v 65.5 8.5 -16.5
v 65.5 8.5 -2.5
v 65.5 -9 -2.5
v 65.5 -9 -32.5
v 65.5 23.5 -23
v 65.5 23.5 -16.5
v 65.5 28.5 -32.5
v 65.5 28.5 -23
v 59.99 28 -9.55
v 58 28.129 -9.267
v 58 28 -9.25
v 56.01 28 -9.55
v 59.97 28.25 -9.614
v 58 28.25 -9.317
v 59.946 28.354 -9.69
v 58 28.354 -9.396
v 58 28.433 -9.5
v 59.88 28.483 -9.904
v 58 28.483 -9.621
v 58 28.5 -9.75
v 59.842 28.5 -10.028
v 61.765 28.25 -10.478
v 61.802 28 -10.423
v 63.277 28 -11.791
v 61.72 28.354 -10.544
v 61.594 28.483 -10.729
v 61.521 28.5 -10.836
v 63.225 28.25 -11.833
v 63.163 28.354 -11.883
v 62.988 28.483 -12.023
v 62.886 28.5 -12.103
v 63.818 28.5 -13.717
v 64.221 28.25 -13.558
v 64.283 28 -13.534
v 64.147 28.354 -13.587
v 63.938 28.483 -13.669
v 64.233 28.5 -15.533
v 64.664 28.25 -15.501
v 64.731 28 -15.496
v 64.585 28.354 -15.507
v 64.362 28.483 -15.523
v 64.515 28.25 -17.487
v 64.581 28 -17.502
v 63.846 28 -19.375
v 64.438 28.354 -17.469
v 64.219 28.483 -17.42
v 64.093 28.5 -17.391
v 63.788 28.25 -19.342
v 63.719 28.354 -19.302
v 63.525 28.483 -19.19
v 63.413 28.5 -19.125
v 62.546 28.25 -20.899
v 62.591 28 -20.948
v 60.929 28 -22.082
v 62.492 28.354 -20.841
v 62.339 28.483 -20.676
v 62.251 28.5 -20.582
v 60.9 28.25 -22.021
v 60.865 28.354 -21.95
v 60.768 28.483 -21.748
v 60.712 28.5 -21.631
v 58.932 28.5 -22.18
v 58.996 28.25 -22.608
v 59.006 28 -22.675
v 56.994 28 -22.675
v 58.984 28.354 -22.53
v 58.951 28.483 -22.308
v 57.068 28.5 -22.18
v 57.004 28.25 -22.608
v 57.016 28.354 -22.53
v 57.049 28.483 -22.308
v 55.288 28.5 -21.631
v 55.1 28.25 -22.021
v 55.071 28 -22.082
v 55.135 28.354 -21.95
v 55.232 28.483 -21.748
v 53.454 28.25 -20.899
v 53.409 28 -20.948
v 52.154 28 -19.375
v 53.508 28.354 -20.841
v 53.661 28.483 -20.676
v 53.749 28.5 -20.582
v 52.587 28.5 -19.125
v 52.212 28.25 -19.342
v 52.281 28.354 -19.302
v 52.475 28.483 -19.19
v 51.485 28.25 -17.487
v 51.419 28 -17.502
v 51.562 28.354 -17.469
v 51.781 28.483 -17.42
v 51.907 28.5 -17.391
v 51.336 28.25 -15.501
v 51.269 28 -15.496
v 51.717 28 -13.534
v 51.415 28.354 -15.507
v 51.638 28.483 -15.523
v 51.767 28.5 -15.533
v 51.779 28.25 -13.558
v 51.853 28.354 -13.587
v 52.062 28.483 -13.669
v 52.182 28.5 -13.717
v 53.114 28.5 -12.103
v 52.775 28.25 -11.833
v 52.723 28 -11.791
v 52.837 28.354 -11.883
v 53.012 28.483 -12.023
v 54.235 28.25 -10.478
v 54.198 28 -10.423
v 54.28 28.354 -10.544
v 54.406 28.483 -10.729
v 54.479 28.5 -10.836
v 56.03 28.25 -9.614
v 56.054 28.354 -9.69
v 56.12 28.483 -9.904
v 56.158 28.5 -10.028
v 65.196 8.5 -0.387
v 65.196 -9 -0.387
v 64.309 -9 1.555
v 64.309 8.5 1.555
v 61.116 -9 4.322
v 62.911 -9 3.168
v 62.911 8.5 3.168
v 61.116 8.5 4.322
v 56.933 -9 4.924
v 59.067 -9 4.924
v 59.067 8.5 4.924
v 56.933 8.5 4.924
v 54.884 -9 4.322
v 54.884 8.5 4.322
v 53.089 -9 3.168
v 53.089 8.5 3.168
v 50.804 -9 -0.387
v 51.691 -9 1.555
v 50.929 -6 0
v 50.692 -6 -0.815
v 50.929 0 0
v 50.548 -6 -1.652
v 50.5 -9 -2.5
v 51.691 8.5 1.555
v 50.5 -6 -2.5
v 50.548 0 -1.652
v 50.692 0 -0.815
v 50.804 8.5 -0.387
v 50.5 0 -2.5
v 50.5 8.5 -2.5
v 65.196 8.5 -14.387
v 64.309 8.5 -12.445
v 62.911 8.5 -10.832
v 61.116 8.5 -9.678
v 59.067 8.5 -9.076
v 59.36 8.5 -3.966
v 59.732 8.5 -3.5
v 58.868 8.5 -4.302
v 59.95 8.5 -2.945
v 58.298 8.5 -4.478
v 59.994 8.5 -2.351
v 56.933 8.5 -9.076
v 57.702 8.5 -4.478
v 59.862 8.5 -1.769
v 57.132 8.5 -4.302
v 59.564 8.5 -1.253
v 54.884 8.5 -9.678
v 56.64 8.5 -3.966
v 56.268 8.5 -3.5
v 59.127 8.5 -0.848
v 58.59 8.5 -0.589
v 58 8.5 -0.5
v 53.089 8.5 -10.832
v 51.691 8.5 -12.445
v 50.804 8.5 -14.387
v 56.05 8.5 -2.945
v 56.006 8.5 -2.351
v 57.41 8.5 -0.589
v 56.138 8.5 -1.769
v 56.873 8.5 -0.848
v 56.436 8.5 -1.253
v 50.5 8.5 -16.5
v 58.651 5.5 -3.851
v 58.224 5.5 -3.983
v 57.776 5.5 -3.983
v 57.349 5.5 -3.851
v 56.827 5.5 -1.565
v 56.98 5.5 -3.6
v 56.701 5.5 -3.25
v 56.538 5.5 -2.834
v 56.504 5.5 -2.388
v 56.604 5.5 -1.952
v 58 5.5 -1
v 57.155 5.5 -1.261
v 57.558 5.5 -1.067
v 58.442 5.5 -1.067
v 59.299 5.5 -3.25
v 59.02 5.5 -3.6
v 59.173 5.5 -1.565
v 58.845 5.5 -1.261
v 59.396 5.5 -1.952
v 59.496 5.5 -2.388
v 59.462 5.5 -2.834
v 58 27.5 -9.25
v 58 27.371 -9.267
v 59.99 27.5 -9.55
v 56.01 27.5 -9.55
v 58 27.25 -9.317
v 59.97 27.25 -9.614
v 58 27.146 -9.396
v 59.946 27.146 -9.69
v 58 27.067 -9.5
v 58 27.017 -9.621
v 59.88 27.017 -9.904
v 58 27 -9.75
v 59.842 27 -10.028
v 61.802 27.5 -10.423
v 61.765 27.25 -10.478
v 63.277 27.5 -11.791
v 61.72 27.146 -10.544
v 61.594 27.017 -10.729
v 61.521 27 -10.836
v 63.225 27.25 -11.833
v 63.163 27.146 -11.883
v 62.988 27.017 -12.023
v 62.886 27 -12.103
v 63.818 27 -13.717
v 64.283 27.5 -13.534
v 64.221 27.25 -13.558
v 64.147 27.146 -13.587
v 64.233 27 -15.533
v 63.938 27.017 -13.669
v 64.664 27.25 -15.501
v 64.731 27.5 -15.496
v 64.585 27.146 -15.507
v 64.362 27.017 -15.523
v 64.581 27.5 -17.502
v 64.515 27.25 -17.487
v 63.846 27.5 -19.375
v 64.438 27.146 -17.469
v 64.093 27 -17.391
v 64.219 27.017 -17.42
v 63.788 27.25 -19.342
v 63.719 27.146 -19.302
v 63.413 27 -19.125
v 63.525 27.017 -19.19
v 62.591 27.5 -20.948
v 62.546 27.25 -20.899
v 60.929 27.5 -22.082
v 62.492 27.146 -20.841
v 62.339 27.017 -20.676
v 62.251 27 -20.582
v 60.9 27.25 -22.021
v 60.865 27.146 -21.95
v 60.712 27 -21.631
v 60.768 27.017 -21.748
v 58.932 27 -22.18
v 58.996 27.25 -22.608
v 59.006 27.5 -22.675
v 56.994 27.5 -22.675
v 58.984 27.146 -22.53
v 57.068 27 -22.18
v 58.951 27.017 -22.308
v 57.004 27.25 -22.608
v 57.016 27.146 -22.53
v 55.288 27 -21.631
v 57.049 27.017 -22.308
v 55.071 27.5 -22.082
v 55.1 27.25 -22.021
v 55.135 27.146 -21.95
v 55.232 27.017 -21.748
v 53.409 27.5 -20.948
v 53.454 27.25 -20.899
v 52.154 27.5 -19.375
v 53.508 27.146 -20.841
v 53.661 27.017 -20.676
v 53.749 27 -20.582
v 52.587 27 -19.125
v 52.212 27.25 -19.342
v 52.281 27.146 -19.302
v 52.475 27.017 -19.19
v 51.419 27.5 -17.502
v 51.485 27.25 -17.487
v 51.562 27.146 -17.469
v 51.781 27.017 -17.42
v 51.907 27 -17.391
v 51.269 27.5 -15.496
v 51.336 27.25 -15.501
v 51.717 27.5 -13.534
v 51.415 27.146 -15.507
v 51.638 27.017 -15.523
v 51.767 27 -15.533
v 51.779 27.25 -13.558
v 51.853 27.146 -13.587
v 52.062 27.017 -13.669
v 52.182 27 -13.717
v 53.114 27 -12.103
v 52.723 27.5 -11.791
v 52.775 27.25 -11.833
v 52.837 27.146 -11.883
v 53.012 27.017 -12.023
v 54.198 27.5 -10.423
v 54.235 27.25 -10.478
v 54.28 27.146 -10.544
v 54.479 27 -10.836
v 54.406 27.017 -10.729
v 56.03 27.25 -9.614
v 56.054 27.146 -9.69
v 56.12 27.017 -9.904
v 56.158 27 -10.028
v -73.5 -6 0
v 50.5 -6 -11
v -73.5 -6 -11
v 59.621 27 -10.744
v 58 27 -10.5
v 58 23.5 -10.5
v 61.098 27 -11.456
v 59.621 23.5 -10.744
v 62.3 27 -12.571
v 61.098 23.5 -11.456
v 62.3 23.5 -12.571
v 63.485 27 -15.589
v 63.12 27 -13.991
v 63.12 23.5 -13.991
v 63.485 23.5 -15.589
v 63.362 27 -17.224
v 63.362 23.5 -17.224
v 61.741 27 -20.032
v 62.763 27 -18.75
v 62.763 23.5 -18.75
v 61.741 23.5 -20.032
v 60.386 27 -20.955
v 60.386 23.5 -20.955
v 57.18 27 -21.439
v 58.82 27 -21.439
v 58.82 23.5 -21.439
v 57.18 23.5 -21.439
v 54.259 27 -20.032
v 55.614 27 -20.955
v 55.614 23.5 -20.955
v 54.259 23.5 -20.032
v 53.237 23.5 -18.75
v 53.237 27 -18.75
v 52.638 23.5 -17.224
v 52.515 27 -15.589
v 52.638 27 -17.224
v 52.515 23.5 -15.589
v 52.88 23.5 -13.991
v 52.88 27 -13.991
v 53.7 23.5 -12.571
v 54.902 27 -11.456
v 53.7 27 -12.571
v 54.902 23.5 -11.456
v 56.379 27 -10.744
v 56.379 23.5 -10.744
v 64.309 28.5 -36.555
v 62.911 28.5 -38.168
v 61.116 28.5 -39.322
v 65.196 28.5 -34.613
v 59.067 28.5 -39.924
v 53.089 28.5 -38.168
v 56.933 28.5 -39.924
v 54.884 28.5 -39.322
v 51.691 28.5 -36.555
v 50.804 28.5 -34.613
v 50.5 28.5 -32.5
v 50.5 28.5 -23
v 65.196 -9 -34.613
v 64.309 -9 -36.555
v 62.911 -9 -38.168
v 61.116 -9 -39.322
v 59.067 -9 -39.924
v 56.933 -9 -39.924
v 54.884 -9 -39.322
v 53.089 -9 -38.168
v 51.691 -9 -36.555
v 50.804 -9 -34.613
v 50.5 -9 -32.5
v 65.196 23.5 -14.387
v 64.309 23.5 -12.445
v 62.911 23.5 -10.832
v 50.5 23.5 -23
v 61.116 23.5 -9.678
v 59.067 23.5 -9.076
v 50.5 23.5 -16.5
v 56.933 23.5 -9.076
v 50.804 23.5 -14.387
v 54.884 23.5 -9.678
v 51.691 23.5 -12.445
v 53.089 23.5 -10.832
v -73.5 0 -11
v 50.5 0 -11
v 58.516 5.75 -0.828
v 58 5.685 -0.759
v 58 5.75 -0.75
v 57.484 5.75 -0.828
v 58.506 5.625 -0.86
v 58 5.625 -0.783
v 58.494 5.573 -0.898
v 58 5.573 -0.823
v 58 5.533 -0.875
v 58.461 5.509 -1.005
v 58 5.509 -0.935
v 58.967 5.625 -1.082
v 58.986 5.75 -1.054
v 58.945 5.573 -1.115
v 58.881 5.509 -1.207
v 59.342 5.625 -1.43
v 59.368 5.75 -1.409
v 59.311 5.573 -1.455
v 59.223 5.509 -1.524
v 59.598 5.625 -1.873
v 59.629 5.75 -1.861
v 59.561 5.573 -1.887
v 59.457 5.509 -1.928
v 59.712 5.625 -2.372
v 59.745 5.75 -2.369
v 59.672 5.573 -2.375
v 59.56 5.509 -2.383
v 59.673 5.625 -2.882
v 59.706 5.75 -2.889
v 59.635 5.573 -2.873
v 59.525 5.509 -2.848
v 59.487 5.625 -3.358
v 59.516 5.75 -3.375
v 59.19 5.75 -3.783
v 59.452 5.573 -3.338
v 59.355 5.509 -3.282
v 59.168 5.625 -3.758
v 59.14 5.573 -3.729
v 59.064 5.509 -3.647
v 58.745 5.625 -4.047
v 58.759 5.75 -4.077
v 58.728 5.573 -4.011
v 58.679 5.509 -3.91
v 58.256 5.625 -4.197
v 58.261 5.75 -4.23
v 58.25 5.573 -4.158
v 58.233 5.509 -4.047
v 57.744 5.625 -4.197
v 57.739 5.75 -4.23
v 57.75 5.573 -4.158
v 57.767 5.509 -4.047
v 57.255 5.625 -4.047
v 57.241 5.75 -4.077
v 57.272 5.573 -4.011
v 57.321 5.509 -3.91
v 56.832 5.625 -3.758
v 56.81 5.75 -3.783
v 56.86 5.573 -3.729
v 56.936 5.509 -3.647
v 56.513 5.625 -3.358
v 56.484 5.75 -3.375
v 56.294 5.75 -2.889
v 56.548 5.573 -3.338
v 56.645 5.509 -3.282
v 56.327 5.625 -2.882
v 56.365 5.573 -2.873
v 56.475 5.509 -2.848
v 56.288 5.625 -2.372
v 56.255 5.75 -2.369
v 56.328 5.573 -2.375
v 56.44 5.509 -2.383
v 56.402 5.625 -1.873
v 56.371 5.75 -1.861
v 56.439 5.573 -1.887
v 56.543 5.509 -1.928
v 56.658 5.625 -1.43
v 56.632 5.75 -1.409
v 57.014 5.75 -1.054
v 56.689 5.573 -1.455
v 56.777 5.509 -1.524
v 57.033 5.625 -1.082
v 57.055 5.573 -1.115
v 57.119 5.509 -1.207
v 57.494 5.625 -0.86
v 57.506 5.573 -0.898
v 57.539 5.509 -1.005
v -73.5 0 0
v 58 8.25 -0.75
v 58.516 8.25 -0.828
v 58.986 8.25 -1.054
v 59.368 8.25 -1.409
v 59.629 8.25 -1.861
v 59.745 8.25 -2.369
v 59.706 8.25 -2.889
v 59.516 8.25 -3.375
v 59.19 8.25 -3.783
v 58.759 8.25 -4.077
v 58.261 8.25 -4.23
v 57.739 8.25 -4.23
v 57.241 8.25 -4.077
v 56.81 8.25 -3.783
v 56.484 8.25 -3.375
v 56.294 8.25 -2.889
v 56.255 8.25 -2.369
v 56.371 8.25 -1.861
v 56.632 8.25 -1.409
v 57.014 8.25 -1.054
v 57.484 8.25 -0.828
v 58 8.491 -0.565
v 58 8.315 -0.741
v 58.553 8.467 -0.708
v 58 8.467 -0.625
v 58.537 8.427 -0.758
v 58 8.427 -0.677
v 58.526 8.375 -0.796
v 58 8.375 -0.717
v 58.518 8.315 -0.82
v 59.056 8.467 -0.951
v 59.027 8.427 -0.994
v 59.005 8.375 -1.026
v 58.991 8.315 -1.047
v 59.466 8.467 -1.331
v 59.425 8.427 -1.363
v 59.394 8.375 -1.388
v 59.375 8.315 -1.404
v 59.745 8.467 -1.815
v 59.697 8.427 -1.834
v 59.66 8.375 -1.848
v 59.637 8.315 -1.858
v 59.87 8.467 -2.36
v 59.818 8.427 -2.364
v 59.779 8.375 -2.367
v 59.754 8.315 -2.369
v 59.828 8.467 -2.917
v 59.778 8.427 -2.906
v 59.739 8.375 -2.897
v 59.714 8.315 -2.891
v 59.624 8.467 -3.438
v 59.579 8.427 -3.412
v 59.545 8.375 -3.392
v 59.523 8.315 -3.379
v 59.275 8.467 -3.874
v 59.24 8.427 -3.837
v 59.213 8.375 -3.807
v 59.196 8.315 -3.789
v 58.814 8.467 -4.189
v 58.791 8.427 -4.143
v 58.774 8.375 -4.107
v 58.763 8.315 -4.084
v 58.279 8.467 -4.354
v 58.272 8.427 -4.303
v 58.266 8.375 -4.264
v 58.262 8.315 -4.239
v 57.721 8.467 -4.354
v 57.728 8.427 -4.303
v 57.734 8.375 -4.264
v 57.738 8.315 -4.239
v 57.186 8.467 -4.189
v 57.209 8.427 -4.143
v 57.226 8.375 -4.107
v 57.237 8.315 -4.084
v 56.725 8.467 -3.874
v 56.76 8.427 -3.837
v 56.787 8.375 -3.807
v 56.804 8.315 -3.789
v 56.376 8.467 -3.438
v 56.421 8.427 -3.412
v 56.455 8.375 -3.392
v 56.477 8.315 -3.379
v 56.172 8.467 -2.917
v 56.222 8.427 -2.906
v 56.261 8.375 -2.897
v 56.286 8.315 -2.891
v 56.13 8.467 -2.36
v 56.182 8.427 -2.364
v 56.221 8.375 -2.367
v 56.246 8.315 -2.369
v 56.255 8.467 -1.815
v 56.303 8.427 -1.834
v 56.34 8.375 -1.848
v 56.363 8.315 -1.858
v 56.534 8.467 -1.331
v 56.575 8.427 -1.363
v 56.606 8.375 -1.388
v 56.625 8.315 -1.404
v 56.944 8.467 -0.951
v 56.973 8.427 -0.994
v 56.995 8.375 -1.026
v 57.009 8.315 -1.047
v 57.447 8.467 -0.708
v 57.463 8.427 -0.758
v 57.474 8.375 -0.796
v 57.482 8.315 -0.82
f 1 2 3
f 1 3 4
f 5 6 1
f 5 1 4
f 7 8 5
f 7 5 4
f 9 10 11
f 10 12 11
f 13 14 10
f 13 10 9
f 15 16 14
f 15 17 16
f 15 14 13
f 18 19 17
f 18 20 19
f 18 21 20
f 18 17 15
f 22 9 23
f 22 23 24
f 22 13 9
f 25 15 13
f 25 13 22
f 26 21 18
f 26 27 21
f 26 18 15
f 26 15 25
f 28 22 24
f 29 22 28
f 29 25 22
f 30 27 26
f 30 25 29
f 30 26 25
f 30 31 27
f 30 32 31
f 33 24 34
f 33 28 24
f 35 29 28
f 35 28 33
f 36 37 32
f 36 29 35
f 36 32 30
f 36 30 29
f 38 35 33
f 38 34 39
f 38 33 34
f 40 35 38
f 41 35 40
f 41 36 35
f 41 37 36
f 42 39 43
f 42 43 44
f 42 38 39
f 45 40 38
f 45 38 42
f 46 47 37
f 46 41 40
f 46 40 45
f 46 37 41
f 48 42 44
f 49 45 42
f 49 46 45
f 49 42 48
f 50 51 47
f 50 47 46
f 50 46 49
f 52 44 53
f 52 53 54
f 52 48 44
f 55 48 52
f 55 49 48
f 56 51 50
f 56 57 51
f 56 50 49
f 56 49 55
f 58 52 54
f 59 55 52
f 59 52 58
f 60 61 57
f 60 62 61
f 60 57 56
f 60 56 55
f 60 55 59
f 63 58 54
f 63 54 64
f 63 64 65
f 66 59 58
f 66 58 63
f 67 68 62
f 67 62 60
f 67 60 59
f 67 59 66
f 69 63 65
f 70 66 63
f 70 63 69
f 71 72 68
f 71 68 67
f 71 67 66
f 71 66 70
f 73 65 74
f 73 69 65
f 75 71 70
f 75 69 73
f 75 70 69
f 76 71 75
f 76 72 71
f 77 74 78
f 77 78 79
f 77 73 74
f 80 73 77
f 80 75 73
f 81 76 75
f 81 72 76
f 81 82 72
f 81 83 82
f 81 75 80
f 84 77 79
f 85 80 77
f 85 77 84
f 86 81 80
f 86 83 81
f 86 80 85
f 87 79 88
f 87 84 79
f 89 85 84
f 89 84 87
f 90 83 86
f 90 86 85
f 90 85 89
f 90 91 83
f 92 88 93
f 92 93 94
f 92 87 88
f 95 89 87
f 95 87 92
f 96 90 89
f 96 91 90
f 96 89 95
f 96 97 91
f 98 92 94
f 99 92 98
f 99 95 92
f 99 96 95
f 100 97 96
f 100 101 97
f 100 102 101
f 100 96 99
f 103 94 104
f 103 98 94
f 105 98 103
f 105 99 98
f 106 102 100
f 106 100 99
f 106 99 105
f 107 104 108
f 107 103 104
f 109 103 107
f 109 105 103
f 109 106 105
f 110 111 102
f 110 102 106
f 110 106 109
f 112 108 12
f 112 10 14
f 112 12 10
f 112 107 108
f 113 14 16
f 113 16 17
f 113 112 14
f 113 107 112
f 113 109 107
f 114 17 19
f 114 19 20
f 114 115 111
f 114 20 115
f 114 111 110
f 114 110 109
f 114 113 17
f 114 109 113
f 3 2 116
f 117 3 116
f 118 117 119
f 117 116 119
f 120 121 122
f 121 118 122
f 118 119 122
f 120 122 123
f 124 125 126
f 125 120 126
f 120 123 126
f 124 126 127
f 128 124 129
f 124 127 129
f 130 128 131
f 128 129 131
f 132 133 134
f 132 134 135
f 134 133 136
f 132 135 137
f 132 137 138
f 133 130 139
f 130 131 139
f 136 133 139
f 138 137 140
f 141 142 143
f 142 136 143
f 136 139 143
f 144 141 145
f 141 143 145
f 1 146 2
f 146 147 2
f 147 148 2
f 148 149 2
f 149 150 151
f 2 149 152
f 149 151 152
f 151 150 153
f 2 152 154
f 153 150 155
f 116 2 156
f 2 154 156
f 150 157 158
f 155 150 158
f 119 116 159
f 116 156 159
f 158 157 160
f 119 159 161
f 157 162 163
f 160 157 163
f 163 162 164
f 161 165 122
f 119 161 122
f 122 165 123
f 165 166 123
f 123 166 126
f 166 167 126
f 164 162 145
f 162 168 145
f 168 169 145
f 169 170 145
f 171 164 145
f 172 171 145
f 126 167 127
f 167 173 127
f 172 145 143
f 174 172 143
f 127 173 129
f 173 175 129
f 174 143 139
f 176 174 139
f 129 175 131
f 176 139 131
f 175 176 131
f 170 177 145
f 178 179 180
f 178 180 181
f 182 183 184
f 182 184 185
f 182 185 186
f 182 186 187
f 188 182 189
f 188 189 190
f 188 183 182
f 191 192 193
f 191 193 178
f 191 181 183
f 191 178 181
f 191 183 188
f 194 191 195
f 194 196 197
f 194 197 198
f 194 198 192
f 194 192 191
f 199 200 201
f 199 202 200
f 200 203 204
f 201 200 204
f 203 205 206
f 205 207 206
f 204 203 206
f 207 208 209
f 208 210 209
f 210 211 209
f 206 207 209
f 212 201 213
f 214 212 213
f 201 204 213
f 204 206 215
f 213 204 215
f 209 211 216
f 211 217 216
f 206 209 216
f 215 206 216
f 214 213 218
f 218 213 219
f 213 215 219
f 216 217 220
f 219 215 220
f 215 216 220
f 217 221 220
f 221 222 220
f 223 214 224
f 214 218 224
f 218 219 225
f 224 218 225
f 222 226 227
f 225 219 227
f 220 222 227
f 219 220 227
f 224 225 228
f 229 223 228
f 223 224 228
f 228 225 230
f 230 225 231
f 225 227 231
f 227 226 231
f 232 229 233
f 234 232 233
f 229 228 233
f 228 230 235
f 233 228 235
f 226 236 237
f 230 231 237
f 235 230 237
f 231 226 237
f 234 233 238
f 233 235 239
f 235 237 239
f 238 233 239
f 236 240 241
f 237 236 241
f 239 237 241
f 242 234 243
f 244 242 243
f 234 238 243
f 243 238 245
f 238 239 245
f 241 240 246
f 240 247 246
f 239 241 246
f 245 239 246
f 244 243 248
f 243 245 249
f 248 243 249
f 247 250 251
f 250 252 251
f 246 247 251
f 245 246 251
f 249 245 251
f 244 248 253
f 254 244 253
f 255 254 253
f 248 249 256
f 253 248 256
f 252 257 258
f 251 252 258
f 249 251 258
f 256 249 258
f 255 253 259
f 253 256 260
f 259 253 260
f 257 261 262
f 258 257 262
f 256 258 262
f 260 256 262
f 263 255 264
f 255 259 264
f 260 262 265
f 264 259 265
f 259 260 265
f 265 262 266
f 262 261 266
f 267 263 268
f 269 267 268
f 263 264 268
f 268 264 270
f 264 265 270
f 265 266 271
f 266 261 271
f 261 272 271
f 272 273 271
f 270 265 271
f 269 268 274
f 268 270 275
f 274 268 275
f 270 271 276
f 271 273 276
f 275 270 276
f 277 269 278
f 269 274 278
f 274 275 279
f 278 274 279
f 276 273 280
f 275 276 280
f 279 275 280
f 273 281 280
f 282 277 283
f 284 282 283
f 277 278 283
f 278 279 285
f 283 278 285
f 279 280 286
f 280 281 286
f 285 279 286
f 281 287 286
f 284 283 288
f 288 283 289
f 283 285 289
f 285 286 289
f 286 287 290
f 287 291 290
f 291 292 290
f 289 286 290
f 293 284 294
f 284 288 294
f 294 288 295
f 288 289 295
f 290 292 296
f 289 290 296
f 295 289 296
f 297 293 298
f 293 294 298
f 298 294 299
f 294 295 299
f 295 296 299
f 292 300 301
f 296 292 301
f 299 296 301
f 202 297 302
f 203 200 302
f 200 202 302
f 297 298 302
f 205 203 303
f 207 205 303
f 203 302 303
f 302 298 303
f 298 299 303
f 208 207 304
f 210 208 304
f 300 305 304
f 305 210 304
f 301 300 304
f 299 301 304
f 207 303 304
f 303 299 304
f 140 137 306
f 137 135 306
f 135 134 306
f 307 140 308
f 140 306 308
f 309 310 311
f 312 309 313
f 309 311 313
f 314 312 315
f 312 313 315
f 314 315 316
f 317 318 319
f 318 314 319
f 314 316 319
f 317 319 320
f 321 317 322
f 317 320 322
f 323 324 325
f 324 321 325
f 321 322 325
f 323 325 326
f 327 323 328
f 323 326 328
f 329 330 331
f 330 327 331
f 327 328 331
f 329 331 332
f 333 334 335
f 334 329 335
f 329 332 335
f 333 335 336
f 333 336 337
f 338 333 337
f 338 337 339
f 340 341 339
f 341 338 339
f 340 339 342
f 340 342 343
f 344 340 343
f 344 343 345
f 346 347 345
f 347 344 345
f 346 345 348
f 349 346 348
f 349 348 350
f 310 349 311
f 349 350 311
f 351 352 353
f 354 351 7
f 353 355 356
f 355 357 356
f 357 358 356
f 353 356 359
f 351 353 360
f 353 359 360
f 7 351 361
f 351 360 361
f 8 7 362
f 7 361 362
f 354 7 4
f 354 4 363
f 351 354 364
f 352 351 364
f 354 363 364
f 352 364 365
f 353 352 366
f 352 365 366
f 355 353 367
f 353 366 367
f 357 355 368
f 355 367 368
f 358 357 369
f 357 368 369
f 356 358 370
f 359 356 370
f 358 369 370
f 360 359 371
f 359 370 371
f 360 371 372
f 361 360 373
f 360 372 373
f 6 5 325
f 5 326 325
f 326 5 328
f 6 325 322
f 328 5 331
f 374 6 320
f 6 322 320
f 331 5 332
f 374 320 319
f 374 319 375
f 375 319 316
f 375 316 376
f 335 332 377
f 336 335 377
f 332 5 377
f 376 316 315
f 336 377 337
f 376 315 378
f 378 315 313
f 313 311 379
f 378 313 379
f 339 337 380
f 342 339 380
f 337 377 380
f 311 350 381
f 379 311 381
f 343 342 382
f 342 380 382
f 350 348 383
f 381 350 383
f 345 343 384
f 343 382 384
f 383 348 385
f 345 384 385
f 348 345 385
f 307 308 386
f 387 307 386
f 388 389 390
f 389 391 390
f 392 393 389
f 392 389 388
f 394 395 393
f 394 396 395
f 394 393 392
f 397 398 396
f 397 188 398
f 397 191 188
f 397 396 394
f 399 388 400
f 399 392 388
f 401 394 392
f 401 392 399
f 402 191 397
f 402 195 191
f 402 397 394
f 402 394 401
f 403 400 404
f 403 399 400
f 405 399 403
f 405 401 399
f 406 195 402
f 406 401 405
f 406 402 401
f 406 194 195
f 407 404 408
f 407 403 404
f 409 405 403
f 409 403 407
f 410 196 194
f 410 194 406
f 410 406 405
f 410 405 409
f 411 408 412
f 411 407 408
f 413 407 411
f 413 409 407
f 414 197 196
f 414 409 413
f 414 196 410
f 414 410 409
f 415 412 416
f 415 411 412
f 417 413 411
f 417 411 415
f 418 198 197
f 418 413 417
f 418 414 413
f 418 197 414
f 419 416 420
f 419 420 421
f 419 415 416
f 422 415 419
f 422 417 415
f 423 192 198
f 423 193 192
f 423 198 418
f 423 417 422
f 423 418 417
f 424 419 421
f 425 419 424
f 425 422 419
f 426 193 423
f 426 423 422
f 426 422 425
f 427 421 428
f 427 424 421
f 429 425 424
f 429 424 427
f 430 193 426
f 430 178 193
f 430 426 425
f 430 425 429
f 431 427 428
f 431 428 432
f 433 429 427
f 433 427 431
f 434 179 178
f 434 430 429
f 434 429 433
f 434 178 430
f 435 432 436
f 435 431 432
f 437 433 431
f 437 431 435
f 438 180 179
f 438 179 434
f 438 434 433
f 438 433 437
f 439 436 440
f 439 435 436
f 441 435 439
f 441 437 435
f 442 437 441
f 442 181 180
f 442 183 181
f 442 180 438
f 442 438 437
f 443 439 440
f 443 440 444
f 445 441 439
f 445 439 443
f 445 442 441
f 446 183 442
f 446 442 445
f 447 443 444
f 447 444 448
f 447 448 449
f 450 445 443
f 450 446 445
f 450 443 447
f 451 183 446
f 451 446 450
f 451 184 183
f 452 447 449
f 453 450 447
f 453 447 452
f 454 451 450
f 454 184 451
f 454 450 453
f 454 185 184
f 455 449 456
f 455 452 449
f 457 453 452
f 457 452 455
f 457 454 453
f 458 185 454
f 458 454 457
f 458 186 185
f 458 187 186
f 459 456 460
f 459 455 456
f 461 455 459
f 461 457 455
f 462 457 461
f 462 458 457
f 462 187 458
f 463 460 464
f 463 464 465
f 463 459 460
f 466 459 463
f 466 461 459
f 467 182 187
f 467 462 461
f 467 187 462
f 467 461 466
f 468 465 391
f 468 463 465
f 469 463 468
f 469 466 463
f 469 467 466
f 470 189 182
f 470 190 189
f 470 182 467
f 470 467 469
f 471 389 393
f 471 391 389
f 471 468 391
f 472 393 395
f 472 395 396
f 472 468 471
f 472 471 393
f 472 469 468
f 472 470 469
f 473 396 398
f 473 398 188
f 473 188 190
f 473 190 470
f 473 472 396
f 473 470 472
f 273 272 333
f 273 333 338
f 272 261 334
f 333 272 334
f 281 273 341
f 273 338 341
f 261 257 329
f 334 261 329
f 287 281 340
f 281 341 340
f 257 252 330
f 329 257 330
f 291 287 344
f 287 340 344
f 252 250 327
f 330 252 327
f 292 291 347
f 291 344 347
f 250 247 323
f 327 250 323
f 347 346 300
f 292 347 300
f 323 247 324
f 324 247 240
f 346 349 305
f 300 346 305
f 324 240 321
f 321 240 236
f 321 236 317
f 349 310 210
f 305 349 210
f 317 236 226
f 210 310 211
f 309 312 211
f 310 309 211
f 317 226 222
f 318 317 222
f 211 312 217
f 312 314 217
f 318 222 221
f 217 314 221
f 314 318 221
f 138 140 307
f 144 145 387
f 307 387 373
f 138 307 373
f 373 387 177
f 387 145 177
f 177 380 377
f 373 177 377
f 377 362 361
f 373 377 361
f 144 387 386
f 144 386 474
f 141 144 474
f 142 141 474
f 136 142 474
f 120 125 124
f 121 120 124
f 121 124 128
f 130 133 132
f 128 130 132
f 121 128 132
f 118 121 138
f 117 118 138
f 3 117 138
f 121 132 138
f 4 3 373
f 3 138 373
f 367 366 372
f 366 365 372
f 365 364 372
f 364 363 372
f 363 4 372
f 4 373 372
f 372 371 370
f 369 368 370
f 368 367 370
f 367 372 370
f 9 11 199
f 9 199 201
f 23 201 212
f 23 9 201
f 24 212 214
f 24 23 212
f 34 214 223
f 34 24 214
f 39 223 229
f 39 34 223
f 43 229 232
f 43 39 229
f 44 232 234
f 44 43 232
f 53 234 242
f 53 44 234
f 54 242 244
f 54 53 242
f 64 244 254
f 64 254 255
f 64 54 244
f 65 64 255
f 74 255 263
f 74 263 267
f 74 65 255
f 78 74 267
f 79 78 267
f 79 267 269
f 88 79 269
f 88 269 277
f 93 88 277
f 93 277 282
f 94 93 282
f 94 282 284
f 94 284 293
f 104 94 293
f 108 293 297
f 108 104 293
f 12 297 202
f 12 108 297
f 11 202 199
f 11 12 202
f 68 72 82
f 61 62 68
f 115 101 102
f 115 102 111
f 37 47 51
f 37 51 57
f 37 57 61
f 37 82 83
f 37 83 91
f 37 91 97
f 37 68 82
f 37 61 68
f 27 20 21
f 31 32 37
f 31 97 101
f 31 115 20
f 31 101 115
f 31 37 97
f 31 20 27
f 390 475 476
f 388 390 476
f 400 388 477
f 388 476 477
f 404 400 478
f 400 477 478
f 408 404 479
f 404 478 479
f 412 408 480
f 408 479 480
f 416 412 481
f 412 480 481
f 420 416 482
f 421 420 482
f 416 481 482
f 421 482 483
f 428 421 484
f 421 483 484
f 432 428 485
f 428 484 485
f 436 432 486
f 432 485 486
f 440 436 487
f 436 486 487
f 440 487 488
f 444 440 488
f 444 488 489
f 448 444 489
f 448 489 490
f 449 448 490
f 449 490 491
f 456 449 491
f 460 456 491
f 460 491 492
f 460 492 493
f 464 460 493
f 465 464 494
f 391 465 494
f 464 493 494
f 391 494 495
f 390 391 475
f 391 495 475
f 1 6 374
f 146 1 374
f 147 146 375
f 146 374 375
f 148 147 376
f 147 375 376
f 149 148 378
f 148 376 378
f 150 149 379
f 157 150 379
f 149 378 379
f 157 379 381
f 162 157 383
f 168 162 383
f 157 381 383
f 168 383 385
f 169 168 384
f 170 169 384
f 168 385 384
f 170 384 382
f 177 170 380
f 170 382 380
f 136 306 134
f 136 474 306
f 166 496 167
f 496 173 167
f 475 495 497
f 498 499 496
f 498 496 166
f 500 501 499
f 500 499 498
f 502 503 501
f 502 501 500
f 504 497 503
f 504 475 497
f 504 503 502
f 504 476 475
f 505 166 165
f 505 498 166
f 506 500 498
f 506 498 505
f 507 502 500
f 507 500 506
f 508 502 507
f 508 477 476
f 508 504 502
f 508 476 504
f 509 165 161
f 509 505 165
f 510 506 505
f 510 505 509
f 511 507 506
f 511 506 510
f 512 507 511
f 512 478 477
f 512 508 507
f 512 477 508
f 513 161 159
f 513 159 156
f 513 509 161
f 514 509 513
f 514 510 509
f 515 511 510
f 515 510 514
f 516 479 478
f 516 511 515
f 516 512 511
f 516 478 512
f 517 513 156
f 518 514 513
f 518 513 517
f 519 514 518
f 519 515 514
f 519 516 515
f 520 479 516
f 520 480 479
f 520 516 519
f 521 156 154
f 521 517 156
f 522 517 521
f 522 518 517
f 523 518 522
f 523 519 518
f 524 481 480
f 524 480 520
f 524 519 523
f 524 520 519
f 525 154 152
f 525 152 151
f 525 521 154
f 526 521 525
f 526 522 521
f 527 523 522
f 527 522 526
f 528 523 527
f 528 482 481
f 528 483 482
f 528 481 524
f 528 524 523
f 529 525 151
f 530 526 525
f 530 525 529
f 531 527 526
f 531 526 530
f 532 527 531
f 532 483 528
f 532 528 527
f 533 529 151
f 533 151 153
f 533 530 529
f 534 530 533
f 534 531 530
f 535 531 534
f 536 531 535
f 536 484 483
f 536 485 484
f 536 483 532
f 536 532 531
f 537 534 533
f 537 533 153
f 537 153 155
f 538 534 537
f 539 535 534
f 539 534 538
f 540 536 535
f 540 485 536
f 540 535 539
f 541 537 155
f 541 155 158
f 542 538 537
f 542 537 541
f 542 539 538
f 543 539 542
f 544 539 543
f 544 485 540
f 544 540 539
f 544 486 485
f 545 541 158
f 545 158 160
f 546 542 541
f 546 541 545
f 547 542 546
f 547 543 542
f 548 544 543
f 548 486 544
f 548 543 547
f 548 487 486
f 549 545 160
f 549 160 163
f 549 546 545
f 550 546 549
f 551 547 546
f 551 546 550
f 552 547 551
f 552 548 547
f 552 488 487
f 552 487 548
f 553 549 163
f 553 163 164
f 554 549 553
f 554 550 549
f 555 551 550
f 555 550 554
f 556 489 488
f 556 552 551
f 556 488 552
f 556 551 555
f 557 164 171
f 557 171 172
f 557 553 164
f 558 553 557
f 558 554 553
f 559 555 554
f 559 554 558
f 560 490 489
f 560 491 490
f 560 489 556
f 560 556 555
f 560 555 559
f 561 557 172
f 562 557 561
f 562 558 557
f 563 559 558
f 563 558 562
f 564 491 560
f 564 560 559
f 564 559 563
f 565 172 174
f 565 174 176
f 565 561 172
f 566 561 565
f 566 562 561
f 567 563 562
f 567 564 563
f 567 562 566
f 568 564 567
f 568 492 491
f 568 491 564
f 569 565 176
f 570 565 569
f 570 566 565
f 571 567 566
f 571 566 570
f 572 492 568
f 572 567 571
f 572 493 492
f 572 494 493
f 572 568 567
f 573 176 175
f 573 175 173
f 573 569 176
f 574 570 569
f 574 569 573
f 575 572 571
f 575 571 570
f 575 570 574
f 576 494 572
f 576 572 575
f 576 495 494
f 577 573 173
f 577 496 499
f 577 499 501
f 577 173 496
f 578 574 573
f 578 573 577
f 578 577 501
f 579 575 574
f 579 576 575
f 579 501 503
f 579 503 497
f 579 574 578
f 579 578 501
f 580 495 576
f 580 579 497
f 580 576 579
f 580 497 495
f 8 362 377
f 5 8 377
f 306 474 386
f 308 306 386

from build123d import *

# Parameters (mm, degrees)
BOSS_EXTRUDE1_START = -73.5
SKETCH1_W           = 11
SKETCH1_H           = 6
BOSS_EXTRUDE1_DEPTH = 124
SKETCH2_W           = 11
SKETCH2_H           = 6
BOSS_EXTRUDE3_DEPTH = 15
FILLET1_R           = 7.5
SKETCH4_R           = 5.5
BOSS_EXTRUDE4_DEPTH = 5
SKETCH5_R           = 6.75
BOSS_EXTRUDE5_DEPTH = 1.5
FILLET2_R           = 0.5
SKETCH6_R           = 1.75
CUT_EXTRUDE1_DEPTH  = 3
FILLET3_R           = 0.25


with BuildPart() as part:
    # Sketch1 → Boss-Extrude1 (new body)
    with BuildSketch(Plane(origin=(0, 0, 0), x_dir=(0, 0, -1), z_dir=(1, 0, 0)).offset(BOSS_EXTRUDE1_START)):
        with Locations((5.5, -3)):
            Rectangle(SKETCH1_W, SKETCH1_H)
    extrude(amount=BOSS_EXTRUDE1_DEPTH)

    # Sketch2 → Boss-Extrude3 (add)
    # profile 1 of 2: a face of its own
    with BuildSketch(Plane(origin=(50.5, 0, 0), x_dir=(0, 0, -1), z_dir=(1, 0, 0))):
        Polygon((-5, 8.5), (-5, -9), (40, -9), (40, 28.5), (23, 28.5), (23, 23.5), (9, 23.5), (9, 8.5), align=None)
        with Locations((5.5, -3)):
            Rectangle(SKETCH2_W, SKETCH2_H, mode=Mode.SUBTRACT)
    # profile 2 of 2: a face of its own
    with BuildSketch(Plane(origin=(50.5, 0, 0), x_dir=(0, 0, -1), z_dir=(1, 0, 0))):
        with Locations((5.5, -3)):
            Rectangle(SKETCH2_W, SKETCH2_H)
    extrude(amount=BOSS_EXTRUDE3_DEPTH)

    # Fillet1
    # the kernel refuses this fillet: 7.5 mm, written as the material it takes off along each edge
    with BuildSketch(Plane(origin=(50.5, 27.25, 5), x_dir=(1, 0, 0), z_dir=(0, -1, 0))) as fillet1_piece_1_section:
        with BuildLine():
            CenterArc((FILLET1_R, -FILLET1_R), FILLET1_R, 90, 90)
            Line((0, -FILLET1_R), (0, 0))
            Line((0, 0), (FILLET1_R, 0))
        make_face()
    fillet1_piece_1 = extrude(amount=55, mode=Mode.PRIVATE)
    fillet1_piece_1 = split(fillet1_piece_1, bisect_by=Plane(origin=(52.221902298, 4.25, 0), z_dir=(0, 0, 1)), keep=Keep.TOP, mode=Mode.PRIVATE)
    add(fillet1_piece_1, mode=Mode.SUBTRACT)
    with BuildSketch(Plane(origin=(50.5, 27.25, 5), x_dir=(1, 0, 0), z_dir=(0, -1, 0))) as fillet1_piece_2_section:
        with BuildLine():
            CenterArc((FILLET1_R, -FILLET1_R), FILLET1_R, 90, 90)
            Line((0, -FILLET1_R), (0, 0))
            Line((0, 0), (FILLET1_R, 0))
        make_face()
    fillet1_piece_2 = extrude(amount=55, mode=Mode.PRIVATE)
    fillet1_piece_2 = split(fillet1_piece_2, bisect_by=Plane(origin=(50.628023306, 0, -0.621369721), z_dir=(0, 1, 0)), keep=Keep.TOP, mode=Mode.PRIVATE)
    add(fillet1_piece_2, mode=Mode.SUBTRACT)
    with BuildSketch(Plane(origin=(50.5, 27.25, 5), x_dir=(1, 0, 0), z_dir=(0, -1, 0))) as fillet1_piece_3_section:
        with BuildLine():
            CenterArc((FILLET1_R, -FILLET1_R), FILLET1_R, 90, 90)
            Line((0, -FILLET1_R), (0, 0))
            Line((0, 0), (FILLET1_R, 0))
        make_face()
    fillet1_piece_3 = extrude(amount=55, mode=Mode.PRIVATE)
    fillet1_piece_3 = split(fillet1_piece_3, bisect_by=Plane(origin=(50.628023306, -6, -0.621369721), z_dir=(0, -1, 0)), keep=Keep.TOP, mode=Mode.PRIVATE)
    add(fillet1_piece_3, mode=Mode.SUBTRACT)
    with BuildSketch(Plane(origin=(65.5, 27.25, 5), x_dir=(-1, 0, 0), z_dir=(0, -1, 0))) as fillet1_piece_4:
        with BuildLine():
            CenterArc((FILLET1_R, FILLET1_R), FILLET1_R, 180, 90)
            Line((0, FILLET1_R), (0, 0))
            Line((0, 0), (FILLET1_R, 0))
        make_face()
    extrude(amount=55, mode=Mode.SUBTRACT)
    with BuildSketch(Plane(origin=(50.5, 42.25, -9), x_dir=(0, 0, -1), z_dir=(0, -1, 0))) as fillet1_piece_5:
        with BuildLine():
            CenterArc((FILLET1_R, FILLET1_R), FILLET1_R, 180, 90)
            Line((0, FILLET1_R), (0, 0))
            Line((0, 0), (FILLET1_R, 0))
        make_face()
    extrude(amount=33.75, mode=Mode.SUBTRACT)
    with BuildSketch(Plane(origin=(65.5, 42.25, -9), x_dir=(0, 0, -1), z_dir=(0, -1, 0))) as fillet1_piece_6:
        with BuildLine():
            CenterArc((FILLET1_R, -FILLET1_R), FILLET1_R, 90, 90)
            Line((0, -FILLET1_R), (0, 0))
            Line((0, 0), (FILLET1_R, 0))
        make_face()
    extrude(amount=33.75, mode=Mode.SUBTRACT)
    with BuildSketch(Plane(origin=(50.5, -27.75, -40), x_dir=(0, 0, 1), z_dir=(0, 1, 0))) as fillet1_piece_7:
        with BuildLine():
            CenterArc((FILLET1_R, FILLET1_R), FILLET1_R, 180, 90)
            Line((0, FILLET1_R), (0, 0))
            Line((0, 0), (FILLET1_R, 0))
        make_face()
    extrude(amount=75, mode=Mode.SUBTRACT)
    with BuildSketch(Plane(origin=(65.5, -27.75, -40), x_dir=(0, 0, 1), z_dir=(0, 1, 0))) as fillet1_piece_8:
        with BuildLine():
            CenterArc((FILLET1_R, -FILLET1_R), FILLET1_R, 90, 90)
            Line((0, -FILLET1_R), (0, 0))
            Line((0, 0), (FILLET1_R, 0))
        make_face()
    extrude(amount=75, mode=Mode.SUBTRACT)

    # Sketch4 → Boss-Extrude4 (add)
    with BuildSketch(Plane(origin=(0, 23.5, 0), x_dir=(1, 0, 0), z_dir=(0, 1, 0))):
        with Locations(Location((58, 16, 0), (0, 0, 270))):
            Circle(SKETCH4_R)
    extrude(amount=BOSS_EXTRUDE4_DEPTH)

    # Sketch5 → Boss-Extrude5 (add)
    with BuildSketch(Plane(origin=(0, 28.5, 0), x_dir=(1, 0, 0), z_dir=(0, 1, 0))):
        with Locations(Location((58, 16, 0), (0, 0, 270))):
            Circle(SKETCH5_R)
    extrude(amount=-BOSS_EXTRUDE5_DEPTH)

    # Fillet2
    fillet2_edges = [part.edges().sort_by_distance(p)[0] for p in [
        (58, 27, -22.75),
        (58, 28.5, -22.75),
    ]]
    fillet(fillet2_edges, radius=FILLET2_R)

    # Sketch6 → Cut-Extrude1 (cut)
    with BuildSketch(Plane(origin=(0, 8.5, 0), x_dir=(1, 0, 0), z_dir=(0, 1, 0))):
        with Locations(Location((58, 2.5, 0), (0, 0, 270))):
            Circle(SKETCH6_R)
    extrude(amount=-CUT_EXTRUDE1_DEPTH, mode=Mode.SUBTRACT)

    # Fillet3
    fillet3_edges = [part.edges().sort_by_distance(p)[0] for p in [
        (58, 5.5, -4.25),
        (58, 8.5, -4.25),
    ]]
    fillet(fillet3_edges, radius=FILLET3_R)


solid = part.part
